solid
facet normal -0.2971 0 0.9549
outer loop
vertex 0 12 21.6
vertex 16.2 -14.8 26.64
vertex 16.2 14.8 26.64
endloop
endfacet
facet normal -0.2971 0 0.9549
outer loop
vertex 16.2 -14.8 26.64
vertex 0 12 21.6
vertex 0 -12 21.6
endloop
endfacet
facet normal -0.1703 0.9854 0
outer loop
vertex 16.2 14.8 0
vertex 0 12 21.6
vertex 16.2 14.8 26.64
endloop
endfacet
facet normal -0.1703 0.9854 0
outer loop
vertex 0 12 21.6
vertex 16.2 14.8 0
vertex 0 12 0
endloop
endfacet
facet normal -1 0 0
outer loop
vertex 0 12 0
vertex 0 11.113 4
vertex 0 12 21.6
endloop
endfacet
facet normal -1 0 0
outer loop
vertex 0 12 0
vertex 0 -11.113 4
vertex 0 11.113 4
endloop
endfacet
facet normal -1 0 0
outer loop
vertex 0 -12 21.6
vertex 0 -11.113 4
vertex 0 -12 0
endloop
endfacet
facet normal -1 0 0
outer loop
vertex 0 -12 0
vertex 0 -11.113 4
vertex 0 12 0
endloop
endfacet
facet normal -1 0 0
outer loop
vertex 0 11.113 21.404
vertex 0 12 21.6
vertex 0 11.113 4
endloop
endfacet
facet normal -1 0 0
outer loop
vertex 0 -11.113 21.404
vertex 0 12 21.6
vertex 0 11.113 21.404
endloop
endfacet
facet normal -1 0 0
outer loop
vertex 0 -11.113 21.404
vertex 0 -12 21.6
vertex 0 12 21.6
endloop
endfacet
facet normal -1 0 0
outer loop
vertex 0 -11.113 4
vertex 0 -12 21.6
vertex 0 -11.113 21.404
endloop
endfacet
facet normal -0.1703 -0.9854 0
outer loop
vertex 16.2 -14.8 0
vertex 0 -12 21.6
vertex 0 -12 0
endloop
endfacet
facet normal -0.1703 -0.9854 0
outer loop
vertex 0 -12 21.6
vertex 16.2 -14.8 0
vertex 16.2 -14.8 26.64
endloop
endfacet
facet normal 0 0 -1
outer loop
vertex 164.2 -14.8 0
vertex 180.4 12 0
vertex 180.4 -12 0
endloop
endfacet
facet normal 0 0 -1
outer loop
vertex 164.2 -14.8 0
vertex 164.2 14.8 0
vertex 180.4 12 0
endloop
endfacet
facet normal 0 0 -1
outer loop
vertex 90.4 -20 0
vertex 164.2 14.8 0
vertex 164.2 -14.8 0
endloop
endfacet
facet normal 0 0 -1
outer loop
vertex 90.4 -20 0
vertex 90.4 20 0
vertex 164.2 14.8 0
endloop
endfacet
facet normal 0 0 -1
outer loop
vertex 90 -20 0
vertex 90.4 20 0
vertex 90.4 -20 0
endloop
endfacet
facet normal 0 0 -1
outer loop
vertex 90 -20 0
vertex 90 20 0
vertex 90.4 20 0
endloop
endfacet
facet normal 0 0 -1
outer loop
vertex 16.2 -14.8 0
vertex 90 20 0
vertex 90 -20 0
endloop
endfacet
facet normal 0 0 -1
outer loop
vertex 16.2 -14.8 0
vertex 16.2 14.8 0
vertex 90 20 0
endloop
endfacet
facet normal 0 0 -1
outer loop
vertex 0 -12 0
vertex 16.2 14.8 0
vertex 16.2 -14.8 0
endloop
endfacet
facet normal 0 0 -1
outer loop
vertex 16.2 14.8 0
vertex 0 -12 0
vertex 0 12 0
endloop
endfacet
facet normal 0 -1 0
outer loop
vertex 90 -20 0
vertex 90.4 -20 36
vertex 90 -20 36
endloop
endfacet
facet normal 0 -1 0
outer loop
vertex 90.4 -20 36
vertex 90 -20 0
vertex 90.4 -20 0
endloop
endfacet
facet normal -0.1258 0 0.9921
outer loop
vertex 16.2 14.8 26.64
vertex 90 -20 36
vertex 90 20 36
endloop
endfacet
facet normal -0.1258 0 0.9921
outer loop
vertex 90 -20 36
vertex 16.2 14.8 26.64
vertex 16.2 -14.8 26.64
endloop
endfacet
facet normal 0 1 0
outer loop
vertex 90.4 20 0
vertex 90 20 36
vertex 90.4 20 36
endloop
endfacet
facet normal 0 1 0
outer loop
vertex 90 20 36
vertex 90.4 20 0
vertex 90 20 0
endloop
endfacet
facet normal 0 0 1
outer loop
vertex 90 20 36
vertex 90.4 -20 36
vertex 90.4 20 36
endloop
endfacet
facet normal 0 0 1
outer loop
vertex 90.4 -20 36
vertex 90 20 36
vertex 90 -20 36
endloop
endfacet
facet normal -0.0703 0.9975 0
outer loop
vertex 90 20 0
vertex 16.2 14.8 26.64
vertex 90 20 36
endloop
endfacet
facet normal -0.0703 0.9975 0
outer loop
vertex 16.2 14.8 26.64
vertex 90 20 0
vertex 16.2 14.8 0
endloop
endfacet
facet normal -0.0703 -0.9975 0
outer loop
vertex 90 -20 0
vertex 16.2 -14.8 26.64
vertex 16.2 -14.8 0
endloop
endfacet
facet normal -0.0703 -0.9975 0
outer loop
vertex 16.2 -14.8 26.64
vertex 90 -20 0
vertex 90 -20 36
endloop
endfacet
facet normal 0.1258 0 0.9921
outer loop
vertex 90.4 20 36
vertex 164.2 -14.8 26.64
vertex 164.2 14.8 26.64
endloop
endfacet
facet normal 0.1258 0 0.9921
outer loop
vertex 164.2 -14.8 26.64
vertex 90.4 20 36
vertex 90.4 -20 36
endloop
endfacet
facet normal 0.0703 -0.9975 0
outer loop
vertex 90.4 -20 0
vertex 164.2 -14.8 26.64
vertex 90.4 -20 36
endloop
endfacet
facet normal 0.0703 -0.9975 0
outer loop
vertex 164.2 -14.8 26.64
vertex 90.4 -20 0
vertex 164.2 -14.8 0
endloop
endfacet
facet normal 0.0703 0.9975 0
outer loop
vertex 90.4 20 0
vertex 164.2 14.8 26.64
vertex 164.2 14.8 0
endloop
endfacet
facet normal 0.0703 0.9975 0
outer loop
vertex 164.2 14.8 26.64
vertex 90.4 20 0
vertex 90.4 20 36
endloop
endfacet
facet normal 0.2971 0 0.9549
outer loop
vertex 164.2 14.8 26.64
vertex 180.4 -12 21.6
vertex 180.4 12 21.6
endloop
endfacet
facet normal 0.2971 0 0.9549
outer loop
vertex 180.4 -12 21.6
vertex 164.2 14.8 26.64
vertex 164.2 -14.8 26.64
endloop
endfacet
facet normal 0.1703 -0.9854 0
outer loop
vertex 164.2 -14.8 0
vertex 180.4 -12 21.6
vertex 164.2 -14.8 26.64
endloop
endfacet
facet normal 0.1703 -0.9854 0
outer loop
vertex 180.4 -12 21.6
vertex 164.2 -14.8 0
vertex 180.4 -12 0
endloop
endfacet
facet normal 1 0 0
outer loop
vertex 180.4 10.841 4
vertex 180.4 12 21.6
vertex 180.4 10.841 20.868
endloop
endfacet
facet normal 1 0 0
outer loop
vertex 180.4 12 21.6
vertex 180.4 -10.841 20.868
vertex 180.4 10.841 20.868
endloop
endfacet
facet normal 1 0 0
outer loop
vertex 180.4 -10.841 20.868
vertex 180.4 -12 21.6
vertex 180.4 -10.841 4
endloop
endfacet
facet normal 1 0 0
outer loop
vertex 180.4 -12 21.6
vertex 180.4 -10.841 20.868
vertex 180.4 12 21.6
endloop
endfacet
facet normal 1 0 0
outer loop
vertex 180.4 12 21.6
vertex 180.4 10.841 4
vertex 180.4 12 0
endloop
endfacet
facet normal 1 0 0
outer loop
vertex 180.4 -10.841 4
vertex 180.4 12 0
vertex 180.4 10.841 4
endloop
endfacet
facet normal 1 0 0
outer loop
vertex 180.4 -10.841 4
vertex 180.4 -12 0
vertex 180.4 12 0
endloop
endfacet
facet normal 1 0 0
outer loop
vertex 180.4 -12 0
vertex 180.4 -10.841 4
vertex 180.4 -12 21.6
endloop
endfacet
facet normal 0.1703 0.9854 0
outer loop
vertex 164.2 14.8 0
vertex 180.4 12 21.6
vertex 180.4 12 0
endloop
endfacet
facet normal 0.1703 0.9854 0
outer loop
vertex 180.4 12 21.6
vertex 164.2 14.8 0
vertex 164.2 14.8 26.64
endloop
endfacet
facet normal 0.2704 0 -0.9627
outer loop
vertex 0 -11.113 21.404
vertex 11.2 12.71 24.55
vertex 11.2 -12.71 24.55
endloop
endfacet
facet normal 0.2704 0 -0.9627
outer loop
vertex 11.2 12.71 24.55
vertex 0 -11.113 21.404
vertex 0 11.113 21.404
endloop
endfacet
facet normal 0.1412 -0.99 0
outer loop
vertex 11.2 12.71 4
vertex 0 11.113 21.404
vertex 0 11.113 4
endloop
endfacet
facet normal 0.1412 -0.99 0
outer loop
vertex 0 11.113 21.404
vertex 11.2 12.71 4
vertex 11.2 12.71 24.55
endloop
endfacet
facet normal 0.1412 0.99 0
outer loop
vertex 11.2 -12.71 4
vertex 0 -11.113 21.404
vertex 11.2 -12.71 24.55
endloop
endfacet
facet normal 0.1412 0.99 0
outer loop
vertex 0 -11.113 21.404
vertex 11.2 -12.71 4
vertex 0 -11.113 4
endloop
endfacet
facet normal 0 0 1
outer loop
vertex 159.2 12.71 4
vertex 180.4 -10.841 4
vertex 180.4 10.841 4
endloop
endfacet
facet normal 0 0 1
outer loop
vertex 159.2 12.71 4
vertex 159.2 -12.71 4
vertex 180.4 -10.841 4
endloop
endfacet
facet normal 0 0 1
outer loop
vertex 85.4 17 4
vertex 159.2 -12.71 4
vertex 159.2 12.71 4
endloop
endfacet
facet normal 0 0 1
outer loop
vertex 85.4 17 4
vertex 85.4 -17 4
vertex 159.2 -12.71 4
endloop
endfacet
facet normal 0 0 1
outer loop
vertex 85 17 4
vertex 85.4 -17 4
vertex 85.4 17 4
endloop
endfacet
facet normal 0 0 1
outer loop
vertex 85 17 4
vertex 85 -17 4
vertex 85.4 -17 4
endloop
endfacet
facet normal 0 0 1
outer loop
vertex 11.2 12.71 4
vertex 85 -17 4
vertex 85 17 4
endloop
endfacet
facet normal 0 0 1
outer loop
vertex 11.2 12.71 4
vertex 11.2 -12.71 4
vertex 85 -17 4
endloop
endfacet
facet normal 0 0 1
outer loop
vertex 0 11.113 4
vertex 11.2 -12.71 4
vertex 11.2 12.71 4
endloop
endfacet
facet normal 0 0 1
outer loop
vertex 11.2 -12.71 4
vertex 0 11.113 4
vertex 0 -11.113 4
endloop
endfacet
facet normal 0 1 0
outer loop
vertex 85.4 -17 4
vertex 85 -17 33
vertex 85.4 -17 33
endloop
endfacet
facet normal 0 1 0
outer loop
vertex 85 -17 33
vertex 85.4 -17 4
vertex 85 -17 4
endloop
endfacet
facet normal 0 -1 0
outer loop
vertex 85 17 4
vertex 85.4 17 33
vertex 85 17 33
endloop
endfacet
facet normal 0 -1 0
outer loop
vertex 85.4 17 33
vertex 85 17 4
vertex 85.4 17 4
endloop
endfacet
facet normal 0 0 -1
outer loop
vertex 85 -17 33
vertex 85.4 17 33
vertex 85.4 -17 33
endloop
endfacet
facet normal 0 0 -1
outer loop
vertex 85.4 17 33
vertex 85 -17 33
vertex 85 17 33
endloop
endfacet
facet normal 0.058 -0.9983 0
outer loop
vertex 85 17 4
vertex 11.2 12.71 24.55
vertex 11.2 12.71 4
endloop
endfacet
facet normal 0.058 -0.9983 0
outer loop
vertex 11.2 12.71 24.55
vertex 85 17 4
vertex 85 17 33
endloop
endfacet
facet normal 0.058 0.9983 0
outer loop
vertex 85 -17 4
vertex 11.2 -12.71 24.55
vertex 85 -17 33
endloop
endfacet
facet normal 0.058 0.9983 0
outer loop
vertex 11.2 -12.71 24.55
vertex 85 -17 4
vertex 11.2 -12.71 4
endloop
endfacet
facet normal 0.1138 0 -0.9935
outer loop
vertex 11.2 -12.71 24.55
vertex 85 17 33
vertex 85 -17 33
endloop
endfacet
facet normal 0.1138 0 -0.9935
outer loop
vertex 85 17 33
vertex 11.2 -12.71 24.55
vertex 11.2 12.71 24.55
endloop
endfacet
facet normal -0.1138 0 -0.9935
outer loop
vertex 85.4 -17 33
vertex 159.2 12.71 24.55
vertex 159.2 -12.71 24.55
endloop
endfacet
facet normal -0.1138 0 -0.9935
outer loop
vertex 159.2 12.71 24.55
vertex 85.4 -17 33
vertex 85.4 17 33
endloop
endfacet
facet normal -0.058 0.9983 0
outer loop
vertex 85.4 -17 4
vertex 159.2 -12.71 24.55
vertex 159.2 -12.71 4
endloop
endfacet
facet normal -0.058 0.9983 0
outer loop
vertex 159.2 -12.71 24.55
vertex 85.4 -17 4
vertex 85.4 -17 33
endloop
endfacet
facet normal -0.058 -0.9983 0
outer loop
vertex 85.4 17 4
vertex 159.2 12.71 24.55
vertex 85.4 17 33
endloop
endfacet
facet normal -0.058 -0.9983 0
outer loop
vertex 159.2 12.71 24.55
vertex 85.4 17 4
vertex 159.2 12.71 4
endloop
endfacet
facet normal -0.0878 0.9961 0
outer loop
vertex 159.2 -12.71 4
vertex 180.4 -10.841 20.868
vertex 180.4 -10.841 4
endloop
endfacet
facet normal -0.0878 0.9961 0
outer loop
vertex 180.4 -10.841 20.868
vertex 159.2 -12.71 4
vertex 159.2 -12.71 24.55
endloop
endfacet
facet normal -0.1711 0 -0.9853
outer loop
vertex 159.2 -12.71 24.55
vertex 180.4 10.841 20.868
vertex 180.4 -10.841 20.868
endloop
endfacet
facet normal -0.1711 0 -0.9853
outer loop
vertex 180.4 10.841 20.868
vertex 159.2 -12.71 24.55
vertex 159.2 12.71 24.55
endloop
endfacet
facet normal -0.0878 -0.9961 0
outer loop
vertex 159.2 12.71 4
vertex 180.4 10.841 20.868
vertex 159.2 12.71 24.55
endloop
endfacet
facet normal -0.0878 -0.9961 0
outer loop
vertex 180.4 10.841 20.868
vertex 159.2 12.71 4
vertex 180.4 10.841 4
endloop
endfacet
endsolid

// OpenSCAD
$fn = 32;

// ----------------------------------------------------------------------
// Faired channel: 180 x 40 x 36 mm, 3 mm walls, faired ends
// ----------------------------------------------------------------------

// --- parameters (mm) ---
length = 180;             // channel length
width = 40;               // channel width at mid length
height = 36;              // channel height at mid length
wall = 3;                 // side wall thickness
floor_t = 4;              // floor thickness
end_w = 24;               // faired end width
end_h = 21.6;             // faired end height

difference() {
  union() {
    hull() {
      translate([0, -12, 0]) cube([0.4, 24, 21.6]);
      translate([16.2, -14.8, 0]) cube([0.4, 29.6, 26.64]);
    }
    hull() {
      translate([16.2, -14.8, 0]) cube([0.4, 29.6, 26.64]);
      translate([90, -20, 0]) cube([0.4, 40, 36]);
    }
    hull() {
      translate([90, -20, 0]) cube([0.4, 40, 36]);
      translate([163.8, -14.8, 0]) cube([0.4, 29.6, 26.64]);
    }
    hull() {
      translate([163.8, -14.8, 0]) cube([0.4, 29.6, 26.64]);
      translate([180, -12, 0]) cube([0.4, 24, 21.6]);
    }
  }
  /* cavity, 5 mm proud of both ends so the ports are cut clean */
  hull() {
    translate([-5, -10.4, 4]) cube([0.4, 20.8, 16]);
    translate([11.2, -12.71, 4]) cube([0.4, 25.42, 20.55]);
  }
  hull() {
    translate([11.2, -12.71, 4]) cube([0.4, 25.42, 20.55]);
    translate([85, -17, 4]) cube([0.4, 34, 29]);
  }
  hull() {
    translate([85, -17, 4]) cube([0.4, 34, 29]);
    translate([158.8, -12.71, 4]) cube([0.4, 25.42, 20.55]);
  }
  hull() {
    translate([158.8, -12.71, 4]) cube([0.4, 25.42, 20.55]);
    translate([185, -10.4, 4]) cube([0.4, 20.8, 16]);
  }
}
